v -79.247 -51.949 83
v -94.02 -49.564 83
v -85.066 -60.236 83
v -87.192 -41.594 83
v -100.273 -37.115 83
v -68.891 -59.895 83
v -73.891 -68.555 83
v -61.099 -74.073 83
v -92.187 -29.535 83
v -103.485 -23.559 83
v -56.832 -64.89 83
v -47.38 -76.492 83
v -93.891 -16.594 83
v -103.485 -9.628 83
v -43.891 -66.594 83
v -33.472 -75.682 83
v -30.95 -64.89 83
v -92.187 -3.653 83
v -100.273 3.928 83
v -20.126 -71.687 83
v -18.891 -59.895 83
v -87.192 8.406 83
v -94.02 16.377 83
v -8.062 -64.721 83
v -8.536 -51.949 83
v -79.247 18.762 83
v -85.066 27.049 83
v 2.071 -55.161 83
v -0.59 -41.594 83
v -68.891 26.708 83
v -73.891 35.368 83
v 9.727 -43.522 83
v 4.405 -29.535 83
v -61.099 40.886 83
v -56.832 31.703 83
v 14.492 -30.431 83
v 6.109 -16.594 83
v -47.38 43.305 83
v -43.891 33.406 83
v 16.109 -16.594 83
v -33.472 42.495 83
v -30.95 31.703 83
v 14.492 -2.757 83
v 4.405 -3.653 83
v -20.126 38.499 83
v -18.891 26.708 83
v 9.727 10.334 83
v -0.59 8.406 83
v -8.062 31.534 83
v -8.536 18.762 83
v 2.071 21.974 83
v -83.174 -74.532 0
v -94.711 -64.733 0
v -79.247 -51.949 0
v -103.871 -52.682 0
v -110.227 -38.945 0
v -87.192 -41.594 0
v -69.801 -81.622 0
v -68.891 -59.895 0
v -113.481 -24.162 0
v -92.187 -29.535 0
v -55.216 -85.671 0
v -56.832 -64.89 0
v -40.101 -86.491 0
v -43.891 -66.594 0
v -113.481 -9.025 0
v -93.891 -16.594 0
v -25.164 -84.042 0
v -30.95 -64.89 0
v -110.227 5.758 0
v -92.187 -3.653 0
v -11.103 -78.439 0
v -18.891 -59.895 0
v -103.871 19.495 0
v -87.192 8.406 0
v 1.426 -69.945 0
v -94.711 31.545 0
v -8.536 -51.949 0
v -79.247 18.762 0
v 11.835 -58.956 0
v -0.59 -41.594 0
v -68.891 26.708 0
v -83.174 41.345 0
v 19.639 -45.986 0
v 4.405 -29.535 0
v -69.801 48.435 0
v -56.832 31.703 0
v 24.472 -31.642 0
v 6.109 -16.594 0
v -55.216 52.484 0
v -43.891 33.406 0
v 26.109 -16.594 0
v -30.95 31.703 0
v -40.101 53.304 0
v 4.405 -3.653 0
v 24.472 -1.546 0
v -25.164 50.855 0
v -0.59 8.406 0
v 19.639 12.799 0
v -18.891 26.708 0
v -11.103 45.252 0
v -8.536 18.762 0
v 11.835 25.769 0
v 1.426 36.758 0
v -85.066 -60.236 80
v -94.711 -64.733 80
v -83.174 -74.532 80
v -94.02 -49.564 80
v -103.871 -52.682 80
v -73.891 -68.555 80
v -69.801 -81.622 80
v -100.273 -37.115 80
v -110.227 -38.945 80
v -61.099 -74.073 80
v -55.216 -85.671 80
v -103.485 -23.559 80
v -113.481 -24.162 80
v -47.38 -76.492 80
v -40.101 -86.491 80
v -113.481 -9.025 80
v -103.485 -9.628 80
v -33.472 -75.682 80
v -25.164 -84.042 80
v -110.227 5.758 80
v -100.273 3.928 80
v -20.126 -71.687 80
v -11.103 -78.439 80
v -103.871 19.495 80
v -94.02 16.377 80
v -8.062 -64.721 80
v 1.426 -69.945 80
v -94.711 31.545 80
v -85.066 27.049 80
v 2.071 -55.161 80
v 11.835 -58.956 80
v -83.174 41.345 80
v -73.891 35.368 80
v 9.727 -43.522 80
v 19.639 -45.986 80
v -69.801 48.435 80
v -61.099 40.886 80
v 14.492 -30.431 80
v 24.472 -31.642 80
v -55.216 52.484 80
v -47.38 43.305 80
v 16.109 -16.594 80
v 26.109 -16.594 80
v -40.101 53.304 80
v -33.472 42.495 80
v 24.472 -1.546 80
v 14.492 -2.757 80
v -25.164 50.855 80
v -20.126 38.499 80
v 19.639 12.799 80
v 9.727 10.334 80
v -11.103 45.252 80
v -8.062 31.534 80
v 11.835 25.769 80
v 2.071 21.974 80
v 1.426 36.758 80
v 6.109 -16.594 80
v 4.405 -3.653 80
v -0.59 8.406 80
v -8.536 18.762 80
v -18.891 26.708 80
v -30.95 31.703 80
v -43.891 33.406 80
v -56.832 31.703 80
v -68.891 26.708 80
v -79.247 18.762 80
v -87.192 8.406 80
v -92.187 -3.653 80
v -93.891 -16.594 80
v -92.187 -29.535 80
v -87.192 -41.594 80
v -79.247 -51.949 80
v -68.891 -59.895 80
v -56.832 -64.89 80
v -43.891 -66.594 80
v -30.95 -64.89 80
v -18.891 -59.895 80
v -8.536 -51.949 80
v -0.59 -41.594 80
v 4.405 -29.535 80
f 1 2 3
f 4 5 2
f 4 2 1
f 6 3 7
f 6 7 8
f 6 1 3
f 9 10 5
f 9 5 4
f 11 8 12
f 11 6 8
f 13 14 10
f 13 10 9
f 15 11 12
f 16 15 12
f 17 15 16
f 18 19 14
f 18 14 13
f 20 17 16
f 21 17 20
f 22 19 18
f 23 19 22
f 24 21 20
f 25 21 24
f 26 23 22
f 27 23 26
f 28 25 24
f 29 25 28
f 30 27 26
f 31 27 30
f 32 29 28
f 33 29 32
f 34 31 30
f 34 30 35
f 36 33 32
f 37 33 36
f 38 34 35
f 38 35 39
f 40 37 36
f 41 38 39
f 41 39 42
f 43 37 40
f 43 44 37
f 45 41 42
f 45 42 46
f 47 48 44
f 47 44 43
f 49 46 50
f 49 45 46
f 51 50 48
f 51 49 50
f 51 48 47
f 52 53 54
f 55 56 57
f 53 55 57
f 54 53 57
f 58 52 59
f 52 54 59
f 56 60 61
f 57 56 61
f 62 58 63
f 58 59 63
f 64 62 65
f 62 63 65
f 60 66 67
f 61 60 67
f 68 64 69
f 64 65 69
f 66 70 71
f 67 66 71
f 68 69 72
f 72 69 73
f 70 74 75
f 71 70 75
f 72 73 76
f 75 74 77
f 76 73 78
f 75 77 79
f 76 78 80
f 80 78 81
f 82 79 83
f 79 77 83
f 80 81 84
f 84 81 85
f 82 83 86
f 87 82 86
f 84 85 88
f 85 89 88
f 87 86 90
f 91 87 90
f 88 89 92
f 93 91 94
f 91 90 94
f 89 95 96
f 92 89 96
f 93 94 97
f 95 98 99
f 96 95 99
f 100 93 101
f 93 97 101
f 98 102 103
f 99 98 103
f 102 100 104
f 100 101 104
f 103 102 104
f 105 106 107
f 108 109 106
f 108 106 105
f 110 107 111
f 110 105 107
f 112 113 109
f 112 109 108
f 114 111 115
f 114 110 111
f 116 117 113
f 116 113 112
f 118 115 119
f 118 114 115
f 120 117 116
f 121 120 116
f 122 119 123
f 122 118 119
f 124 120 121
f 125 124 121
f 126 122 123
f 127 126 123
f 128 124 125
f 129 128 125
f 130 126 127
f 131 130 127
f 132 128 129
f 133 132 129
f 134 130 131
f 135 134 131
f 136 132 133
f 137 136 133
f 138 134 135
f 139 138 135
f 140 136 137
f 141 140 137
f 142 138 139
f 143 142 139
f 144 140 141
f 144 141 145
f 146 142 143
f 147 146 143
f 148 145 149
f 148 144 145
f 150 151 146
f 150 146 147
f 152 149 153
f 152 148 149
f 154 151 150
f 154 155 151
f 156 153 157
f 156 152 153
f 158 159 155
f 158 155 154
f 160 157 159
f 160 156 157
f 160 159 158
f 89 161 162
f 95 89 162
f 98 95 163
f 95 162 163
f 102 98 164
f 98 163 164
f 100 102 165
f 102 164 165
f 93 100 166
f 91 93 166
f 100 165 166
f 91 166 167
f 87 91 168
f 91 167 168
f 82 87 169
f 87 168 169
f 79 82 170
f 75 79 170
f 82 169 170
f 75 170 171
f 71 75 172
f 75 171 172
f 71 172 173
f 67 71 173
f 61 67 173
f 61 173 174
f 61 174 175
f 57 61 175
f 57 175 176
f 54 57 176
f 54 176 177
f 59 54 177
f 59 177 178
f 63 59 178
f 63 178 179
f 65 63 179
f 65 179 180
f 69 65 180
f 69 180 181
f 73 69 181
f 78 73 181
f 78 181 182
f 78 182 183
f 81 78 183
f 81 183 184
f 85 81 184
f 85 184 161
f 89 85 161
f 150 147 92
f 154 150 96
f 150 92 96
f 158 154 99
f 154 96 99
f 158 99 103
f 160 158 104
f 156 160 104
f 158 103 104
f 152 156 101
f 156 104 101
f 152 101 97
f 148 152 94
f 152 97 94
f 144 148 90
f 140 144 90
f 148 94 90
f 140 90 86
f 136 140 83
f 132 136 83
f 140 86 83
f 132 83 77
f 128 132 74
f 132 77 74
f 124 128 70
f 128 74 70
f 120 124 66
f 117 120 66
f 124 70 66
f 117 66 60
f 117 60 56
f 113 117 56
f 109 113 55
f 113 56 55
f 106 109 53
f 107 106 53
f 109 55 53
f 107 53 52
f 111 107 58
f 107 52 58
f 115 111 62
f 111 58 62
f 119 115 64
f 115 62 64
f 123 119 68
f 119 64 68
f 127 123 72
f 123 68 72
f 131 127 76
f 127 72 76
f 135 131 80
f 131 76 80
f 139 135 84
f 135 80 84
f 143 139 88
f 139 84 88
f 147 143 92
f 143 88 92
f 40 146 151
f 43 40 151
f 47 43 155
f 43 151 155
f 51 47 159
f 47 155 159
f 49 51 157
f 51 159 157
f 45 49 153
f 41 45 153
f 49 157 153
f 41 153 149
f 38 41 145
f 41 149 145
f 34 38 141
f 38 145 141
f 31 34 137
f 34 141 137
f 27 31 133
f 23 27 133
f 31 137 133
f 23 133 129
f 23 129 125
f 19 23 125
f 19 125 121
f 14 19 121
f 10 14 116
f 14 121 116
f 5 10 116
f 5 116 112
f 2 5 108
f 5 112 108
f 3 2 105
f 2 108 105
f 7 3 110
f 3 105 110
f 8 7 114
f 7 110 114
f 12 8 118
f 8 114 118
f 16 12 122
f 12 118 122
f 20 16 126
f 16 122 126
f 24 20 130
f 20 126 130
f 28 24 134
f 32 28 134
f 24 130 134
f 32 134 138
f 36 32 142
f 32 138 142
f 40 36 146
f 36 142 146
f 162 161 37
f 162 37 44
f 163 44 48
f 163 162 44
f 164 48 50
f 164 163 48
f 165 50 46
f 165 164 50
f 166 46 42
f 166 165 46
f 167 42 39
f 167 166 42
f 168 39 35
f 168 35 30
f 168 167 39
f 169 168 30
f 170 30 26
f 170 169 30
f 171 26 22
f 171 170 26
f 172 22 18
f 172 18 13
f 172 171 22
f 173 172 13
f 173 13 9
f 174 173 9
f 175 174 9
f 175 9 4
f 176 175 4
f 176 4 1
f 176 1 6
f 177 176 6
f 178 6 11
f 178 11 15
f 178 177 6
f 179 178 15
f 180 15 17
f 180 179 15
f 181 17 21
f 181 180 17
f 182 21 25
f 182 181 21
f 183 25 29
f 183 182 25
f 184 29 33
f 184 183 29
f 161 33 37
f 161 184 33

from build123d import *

# Parameters (mm, degrees)
F0_R     = 70
F1_DEPTH = 80
F2_R     = 50
F3_DEPTH = 100
F4_R     = 60
F4_R_2   = 50
F5_DEPTH = 3


with BuildPart() as f1:
    # F0 (on Top) → F1 (new body)
    with BuildSketch(Plane.XY):
        with Locations((-43.891169, -16.593579)):
            Circle(F0_R)
    extrude(amount=F1_DEPTH)

    # F2 (on face) → F3 (cut)
    with BuildSketch(Plane.XY.offset(80)):
        with Locations((-43.891169, -16.593579)):
            Circle(F2_R)
    extrude(amount=-F3_DEPTH, mode=Mode.SUBTRACT)

    # F4 (on face) → F5 (join)
    with BuildSketch(Plane.XY.offset(80)):
        with Locations((-43.891169, -16.593579)):
            Circle(F4_R)
        with Locations((-43.891169, -16.593579)):
            Circle(F4_R_2, mode=Mode.SUBTRACT)
    extrude(amount=F5_DEPTH)


solid = f1.part
